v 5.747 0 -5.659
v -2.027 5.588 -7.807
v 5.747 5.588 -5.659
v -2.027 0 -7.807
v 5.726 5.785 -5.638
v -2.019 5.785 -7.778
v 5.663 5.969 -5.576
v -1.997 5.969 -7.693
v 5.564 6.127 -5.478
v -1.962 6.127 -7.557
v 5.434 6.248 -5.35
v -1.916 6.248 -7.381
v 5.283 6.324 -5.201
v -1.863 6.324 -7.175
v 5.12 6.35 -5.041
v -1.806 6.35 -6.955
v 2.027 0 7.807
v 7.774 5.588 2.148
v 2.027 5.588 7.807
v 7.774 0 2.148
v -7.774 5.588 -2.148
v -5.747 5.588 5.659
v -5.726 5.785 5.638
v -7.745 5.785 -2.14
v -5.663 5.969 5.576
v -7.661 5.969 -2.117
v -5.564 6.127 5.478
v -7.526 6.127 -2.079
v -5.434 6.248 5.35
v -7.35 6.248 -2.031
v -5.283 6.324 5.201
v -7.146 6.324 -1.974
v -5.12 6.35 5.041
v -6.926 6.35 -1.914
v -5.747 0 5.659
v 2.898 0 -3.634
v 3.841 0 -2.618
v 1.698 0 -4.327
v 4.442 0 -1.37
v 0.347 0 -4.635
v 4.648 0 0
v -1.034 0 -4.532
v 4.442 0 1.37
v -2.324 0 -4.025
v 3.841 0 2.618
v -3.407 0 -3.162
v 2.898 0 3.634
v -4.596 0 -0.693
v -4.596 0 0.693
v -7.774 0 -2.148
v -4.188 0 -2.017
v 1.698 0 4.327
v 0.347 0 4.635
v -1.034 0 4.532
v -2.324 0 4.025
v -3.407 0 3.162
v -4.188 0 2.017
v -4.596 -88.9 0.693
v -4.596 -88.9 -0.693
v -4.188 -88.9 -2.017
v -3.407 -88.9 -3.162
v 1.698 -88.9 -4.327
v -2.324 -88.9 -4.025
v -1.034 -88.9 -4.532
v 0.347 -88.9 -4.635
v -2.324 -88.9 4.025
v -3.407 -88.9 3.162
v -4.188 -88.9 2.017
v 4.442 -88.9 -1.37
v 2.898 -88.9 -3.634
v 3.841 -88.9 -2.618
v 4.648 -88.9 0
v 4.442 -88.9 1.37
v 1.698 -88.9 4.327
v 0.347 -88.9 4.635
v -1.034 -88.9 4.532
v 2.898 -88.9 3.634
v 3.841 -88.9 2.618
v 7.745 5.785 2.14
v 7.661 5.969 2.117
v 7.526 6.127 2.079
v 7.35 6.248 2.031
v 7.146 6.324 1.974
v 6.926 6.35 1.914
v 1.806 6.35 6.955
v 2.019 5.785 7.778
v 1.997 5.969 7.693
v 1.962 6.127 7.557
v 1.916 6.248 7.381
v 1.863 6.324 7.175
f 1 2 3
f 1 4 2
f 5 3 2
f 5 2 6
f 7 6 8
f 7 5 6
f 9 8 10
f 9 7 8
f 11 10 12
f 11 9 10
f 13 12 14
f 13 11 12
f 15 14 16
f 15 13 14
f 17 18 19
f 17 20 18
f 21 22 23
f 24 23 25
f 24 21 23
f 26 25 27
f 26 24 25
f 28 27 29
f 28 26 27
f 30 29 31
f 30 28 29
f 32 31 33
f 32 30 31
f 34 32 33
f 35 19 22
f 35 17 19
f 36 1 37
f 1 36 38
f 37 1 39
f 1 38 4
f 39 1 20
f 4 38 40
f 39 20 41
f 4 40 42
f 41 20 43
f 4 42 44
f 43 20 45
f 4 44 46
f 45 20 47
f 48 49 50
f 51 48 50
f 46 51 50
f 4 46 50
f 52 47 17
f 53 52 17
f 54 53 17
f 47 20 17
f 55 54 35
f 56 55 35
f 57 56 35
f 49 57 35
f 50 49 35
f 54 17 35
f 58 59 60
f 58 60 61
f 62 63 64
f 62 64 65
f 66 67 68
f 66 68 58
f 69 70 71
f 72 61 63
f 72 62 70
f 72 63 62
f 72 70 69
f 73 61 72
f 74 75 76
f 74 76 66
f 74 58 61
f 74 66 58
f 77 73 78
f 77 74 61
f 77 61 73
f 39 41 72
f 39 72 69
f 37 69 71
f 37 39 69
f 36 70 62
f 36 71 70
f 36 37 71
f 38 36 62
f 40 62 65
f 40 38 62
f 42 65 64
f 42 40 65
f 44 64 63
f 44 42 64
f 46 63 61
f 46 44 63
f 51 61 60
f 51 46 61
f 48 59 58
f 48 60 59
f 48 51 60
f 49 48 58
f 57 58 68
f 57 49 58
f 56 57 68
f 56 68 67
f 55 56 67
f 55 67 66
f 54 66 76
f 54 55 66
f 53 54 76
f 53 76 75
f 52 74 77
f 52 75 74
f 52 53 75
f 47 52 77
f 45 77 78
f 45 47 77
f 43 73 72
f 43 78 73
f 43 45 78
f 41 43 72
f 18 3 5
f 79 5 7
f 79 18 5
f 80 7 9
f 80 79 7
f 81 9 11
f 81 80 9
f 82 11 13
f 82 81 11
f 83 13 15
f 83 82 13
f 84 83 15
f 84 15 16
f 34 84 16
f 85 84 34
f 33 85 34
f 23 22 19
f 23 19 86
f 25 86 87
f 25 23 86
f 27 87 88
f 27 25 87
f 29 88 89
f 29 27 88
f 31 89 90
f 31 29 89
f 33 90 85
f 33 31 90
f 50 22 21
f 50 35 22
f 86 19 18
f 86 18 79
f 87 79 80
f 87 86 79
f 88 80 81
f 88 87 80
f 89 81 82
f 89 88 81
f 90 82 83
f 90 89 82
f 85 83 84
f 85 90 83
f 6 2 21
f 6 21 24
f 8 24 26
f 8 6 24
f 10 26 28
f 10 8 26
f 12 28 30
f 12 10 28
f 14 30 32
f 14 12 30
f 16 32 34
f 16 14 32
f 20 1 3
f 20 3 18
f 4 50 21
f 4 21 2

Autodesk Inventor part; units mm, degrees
ref_plane "YZ Plane" through (0, 0, 0) normal (1, 0, 0) x (0, 1, 0)
ref_plane "XZ Plane" through (0, 0, 0) normal (0, 1, 0) x (-1, 0, 0)
ref_plane "XY Plane" through (0, 0, 0) normal (0, 0, 1) x (1, 0, 0)
sketch "Sketch1" plane through (0, 0, 0) normal (0, 1, 0) x (-1, 0, 0)
  line L0 (-2.027, 7.8067) -> (5.7473, 5.6588)
  line L1 (5.7473, 5.6588) -> (7.7743, -2.1479)
  line L2 (7.7743, -2.1479) -> (2.027, -7.8067)
  line L3 (2.027, -7.8067) -> (-5.7473, -5.6588)
  line L4 (-5.7473, -5.6588) -> (-7.7743, 2.1479)
  line L5 (-7.7743, 2.1479) -> (-2.027, 7.8067)
  point P0 (0, 0)
  point P1 (0, 0)
  dimension "d8" = 13.97
extrude "Extrusion1" add sketch "Sketch1" along normal blind 6.35
fillet "Fillet1" radius 0.762 6 edges at (4.9007, 6.35, 4.9773) (6.7608, 6.35, -1.7554) (1.8602, 6.35, -6.7328) (-4.9007, 6.35, -4.9773) (-6.7608, 6.35, 1.7554) (-1.8602, 6.35, 6.7328)
sketch "Sketch2" plane through (0, 0, 0) normal (0, -1, 0) x (1, 0, 0)
  circle A0 centre (0, 0) radius 4.6482
  dimension "d3" = 9.2964
extrude "Extrusion2" add sketch "Sketch2" along normal blind 88.9
thread "Thread1" size "3/8-16 UNC" class "2A" standard "ANSI Unified Screw Threads" full length
properties part number "lagBolt_38" material "Steel, Galvanized"
